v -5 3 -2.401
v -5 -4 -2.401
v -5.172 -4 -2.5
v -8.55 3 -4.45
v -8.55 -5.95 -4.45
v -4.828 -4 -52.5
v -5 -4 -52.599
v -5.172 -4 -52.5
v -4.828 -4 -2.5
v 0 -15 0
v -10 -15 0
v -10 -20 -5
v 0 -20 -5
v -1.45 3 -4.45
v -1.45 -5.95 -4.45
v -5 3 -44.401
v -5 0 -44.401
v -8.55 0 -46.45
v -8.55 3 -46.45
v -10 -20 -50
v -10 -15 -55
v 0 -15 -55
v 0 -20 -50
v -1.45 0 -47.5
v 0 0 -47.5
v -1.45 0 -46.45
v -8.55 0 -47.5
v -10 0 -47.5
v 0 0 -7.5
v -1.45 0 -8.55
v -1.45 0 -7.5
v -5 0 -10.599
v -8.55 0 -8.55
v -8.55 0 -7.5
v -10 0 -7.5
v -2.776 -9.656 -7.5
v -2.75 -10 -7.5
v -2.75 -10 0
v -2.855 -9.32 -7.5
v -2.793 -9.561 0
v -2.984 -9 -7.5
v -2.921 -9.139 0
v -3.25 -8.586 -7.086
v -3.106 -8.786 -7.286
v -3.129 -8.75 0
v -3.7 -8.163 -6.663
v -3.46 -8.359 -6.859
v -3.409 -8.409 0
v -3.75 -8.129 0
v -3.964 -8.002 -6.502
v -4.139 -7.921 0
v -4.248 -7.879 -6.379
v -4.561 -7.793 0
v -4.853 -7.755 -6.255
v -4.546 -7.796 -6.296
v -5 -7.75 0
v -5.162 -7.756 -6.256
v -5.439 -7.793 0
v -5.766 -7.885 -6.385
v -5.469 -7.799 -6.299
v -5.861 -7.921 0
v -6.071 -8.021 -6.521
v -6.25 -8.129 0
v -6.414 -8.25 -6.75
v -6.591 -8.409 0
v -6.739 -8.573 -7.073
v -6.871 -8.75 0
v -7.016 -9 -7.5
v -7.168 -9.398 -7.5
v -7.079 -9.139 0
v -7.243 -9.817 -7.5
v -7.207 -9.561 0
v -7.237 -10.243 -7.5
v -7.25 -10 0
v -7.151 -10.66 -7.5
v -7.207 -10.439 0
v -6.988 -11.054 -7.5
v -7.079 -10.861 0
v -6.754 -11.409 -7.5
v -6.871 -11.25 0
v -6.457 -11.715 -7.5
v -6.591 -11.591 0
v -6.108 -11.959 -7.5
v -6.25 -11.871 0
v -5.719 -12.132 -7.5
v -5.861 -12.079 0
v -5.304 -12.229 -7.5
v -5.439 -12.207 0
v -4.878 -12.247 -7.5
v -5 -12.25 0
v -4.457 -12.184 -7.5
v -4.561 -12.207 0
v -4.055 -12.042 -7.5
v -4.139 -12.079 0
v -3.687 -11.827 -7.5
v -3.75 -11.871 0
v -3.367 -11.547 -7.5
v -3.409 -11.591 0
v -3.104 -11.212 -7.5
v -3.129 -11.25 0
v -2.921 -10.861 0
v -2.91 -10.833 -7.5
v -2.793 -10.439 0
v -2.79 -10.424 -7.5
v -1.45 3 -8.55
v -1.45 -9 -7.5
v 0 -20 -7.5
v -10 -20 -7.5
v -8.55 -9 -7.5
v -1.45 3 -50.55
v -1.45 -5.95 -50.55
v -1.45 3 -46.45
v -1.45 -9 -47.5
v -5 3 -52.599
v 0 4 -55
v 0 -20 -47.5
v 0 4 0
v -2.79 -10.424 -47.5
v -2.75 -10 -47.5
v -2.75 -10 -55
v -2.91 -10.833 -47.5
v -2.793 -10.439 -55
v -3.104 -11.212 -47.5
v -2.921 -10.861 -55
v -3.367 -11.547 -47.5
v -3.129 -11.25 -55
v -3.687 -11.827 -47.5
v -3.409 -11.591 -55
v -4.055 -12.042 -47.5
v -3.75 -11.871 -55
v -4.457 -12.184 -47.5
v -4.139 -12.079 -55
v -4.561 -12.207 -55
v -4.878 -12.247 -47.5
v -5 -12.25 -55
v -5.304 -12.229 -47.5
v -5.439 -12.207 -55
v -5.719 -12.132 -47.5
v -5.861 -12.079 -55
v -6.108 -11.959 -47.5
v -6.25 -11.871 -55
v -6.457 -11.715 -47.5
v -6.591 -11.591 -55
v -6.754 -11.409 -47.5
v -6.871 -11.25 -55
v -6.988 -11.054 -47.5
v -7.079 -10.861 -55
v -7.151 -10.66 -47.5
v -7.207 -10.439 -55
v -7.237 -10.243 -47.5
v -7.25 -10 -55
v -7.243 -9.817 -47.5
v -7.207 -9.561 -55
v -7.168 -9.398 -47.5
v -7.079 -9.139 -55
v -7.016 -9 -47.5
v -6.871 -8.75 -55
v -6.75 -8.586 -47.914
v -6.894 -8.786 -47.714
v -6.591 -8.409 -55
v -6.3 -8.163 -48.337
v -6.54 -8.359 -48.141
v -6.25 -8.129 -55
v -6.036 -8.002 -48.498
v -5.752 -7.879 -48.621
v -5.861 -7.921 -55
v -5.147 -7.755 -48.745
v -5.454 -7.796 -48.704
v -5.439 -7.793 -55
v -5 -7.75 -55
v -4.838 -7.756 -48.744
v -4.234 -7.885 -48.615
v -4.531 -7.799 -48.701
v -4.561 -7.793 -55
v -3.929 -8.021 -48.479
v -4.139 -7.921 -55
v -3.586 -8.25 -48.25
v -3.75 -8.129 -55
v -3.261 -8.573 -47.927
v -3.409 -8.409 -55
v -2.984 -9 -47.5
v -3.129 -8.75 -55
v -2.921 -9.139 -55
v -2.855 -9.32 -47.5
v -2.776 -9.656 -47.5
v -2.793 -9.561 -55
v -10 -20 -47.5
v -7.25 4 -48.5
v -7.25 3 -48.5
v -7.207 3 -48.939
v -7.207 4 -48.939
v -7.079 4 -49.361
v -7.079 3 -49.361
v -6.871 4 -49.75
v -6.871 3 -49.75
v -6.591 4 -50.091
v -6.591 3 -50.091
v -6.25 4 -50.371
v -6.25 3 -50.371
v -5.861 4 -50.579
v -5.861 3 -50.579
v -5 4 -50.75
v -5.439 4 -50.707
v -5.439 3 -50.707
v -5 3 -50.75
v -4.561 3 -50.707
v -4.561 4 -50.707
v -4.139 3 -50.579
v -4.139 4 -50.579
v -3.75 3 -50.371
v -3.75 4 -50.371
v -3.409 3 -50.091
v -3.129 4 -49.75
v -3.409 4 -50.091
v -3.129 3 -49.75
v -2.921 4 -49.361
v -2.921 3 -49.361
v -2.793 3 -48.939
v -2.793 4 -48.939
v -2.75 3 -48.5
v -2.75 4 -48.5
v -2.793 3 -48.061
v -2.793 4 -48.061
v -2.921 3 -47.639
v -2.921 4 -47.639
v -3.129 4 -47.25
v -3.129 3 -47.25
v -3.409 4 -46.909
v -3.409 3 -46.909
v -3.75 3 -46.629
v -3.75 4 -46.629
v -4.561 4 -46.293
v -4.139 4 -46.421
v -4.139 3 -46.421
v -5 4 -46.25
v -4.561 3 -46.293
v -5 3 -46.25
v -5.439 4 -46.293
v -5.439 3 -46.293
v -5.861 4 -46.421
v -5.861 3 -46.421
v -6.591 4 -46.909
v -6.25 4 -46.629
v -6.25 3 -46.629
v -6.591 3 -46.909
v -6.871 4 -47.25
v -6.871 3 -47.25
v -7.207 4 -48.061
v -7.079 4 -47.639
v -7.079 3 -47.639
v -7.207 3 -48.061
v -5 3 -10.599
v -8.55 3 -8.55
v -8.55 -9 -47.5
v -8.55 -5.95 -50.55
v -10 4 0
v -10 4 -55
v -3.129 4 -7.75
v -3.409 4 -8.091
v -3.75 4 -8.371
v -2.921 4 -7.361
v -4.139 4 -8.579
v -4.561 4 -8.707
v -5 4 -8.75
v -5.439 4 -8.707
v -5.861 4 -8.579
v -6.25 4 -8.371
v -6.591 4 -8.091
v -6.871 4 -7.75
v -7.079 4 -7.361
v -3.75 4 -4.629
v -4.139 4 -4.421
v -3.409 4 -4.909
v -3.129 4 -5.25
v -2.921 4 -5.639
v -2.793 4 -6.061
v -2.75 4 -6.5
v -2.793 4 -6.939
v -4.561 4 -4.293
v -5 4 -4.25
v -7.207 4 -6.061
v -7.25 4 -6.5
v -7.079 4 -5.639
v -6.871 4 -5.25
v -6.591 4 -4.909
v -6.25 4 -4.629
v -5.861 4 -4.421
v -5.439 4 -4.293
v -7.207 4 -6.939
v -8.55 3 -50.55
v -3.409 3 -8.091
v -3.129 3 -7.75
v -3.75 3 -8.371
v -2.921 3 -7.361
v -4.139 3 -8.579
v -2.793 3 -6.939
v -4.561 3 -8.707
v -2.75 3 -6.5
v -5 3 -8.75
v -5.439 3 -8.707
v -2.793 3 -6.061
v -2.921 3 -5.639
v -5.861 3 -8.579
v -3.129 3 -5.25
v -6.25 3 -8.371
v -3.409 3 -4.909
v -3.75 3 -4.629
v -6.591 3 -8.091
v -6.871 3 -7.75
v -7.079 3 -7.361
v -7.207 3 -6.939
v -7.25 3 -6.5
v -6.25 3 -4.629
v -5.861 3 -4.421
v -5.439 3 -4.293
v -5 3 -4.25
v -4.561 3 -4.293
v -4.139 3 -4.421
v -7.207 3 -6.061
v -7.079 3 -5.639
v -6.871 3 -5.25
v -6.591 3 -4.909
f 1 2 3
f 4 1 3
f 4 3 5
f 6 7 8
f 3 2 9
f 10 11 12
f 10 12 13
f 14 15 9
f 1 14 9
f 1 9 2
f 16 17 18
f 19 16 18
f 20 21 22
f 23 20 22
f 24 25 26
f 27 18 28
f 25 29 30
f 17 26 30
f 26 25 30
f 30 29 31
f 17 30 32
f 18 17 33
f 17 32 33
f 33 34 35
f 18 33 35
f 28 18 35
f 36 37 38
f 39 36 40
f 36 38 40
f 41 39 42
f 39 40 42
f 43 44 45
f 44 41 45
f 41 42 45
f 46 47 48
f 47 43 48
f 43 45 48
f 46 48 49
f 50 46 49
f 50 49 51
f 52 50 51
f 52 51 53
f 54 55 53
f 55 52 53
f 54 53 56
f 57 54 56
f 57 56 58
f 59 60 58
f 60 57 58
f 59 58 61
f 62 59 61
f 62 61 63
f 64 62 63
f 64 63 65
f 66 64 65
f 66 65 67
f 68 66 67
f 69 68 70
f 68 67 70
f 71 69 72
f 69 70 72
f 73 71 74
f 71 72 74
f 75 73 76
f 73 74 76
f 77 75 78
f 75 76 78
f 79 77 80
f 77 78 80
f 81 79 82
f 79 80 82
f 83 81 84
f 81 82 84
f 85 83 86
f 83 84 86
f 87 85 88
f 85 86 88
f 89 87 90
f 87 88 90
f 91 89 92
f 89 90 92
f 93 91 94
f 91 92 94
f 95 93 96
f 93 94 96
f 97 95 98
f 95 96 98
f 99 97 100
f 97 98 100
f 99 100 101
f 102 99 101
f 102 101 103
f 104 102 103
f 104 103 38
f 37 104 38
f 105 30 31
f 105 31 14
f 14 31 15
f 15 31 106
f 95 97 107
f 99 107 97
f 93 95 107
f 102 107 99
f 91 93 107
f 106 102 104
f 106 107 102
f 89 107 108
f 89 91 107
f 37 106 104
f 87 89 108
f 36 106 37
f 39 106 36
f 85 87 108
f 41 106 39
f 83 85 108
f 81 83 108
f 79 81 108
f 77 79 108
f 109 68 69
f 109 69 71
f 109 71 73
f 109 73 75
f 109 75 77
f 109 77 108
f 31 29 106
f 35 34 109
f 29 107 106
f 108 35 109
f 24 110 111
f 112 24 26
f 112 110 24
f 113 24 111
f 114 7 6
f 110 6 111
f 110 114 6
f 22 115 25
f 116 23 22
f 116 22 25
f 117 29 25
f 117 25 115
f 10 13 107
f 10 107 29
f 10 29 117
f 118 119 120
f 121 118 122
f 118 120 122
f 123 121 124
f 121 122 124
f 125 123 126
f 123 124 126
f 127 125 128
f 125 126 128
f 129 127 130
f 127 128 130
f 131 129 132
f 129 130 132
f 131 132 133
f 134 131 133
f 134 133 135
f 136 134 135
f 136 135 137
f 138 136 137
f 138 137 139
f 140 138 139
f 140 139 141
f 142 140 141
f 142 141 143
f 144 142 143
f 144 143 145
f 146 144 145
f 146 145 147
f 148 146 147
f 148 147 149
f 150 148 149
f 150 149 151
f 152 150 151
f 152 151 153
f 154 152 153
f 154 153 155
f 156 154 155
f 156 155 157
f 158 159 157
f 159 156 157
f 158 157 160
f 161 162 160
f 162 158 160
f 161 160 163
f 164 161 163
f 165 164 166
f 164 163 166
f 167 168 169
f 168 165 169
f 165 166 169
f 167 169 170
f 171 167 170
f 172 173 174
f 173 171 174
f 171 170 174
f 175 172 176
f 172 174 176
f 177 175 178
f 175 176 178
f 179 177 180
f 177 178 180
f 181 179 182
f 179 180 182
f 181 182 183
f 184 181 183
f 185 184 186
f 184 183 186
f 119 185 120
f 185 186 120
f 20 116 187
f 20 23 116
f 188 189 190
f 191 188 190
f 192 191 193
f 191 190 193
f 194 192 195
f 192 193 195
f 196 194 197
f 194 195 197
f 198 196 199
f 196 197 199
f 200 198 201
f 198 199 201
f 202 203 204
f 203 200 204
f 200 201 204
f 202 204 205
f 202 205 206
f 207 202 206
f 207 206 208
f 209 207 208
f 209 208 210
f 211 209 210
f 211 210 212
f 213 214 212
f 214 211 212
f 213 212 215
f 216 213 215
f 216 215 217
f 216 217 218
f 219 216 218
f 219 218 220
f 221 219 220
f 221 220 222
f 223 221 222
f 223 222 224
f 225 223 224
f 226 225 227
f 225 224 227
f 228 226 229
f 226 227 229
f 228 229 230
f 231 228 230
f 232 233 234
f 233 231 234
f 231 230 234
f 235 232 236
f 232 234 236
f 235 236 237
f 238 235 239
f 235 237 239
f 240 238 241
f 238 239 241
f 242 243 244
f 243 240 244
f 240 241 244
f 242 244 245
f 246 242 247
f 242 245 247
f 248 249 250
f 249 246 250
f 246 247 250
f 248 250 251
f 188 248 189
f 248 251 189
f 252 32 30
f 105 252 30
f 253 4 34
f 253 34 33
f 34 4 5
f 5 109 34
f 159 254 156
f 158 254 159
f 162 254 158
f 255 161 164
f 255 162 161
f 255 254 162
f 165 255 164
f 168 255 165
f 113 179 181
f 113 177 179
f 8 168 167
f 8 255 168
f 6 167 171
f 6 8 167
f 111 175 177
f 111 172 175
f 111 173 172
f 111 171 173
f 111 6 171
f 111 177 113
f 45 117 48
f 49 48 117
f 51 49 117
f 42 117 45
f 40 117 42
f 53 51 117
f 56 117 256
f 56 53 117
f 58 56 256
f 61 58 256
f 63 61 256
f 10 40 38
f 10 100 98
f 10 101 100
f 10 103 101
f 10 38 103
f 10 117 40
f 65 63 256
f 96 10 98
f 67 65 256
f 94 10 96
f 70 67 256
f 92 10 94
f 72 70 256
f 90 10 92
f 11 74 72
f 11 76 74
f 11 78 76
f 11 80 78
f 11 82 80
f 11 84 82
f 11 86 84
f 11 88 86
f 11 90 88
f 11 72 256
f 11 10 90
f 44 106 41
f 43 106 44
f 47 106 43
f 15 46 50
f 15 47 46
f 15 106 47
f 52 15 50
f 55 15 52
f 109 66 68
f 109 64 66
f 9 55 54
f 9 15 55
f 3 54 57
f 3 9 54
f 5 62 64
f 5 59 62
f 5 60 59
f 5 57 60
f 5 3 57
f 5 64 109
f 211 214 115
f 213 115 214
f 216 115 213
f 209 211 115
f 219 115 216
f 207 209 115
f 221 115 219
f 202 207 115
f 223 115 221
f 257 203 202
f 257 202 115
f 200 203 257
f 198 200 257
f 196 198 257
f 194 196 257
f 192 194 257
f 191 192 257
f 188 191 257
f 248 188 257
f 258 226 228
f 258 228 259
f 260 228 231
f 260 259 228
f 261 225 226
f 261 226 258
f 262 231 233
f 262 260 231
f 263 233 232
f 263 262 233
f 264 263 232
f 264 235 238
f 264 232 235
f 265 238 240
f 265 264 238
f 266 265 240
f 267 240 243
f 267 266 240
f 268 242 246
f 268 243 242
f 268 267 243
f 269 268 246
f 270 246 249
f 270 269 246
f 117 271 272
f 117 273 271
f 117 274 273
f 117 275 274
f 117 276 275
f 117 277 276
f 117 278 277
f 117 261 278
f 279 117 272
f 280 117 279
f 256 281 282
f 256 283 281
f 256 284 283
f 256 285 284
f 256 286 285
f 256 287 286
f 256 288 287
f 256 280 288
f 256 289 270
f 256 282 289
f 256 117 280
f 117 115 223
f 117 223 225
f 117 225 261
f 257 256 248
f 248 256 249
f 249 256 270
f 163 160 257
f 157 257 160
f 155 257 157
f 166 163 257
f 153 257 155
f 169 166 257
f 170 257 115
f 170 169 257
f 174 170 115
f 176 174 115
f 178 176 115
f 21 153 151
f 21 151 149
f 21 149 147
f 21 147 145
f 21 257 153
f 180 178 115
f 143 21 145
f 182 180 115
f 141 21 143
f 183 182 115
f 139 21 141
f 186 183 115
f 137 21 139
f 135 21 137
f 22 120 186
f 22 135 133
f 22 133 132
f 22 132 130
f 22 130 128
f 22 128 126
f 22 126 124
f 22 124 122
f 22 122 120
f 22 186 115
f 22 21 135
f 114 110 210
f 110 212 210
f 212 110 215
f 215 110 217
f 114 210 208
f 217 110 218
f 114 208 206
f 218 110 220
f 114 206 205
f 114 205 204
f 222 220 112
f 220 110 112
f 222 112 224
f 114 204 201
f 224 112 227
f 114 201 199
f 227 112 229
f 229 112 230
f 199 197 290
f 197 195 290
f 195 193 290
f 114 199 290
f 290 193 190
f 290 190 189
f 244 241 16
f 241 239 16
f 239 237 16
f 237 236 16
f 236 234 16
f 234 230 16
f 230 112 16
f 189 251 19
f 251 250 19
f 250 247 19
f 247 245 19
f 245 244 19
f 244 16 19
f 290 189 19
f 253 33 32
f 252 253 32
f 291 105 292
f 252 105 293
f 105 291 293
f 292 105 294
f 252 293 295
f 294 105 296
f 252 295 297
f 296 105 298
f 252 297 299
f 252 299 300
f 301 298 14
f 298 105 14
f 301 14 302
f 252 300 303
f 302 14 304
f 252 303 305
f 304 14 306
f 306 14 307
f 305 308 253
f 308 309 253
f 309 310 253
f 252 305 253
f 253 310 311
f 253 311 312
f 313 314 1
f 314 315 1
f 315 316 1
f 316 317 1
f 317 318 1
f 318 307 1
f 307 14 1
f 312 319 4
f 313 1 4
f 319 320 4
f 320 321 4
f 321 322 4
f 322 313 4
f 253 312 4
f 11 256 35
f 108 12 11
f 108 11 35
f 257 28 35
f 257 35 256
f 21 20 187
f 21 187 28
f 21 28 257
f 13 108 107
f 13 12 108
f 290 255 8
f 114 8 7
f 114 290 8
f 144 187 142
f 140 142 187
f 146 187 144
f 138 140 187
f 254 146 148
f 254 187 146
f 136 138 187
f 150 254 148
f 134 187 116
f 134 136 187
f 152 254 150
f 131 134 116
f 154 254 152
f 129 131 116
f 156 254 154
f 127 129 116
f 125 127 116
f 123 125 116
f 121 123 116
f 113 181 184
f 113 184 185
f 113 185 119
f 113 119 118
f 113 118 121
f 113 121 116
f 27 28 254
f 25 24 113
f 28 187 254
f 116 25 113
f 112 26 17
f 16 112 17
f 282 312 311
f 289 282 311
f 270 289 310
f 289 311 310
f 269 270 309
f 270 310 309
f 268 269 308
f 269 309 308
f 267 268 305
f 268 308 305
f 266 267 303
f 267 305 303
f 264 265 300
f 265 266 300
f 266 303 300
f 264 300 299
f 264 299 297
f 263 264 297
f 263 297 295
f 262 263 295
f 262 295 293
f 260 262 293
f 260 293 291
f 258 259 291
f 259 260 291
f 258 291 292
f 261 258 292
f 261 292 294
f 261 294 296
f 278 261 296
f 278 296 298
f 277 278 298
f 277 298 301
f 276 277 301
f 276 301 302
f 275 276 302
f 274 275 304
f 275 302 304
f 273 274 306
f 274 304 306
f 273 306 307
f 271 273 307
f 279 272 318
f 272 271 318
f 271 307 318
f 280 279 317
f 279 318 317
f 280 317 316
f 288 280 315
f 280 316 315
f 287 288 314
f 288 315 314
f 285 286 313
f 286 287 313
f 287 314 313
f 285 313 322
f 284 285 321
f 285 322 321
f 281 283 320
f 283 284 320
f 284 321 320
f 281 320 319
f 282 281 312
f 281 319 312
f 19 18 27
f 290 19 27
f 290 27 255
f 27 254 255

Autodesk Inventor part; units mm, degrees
ref_plane "YZ Plane" through (0, 0, 0) normal (1, 0, 0) x (0, 1, 0)
ref_plane "XZ Plane" through (0, 0, 0) normal (0, 1, 0) x (-1, 0, 0)
sketch "Sketch1" plane through (0, 0, 0) normal (0, 1, 0) x (-1, 0, 0)
  line L0 (0, 0) -> (10, 0)
  line L1 (10, 0) -> (10, -55)
  line L2 (10, -55) -> (0, -55)
  line L3 (0, -55) -> (0, 0)
  line L4 (5, 0) -> (5, -6.5) construction
  line L5 (5, -6.5) -> (5, -48.5) construction
  circle A0 centre (5, -6.5) radius 2.25
  circle A1 centre (5, -48.5) radius 2.25
  line L6 (5, -27.5) -> (10, -27.5) construction
  line L7 (8.55, -4.4504) -> (8.55, -8.5496)
  line L8 (8.55, -8.5496) -> (5, -10.5992)
  line L9 (5, -10.5992) -> (1.45, -8.5496)
  line L10 (1.45, -8.5496) -> (1.45, -4.4504)
  line L11 (1.45, -4.4504) -> (5, -2.4008)
  line L12 (5, -2.4008) -> (8.55, -4.4504)
  line L13 (5, -44.4008) -> (8.55, -46.4504)
  line L14 (8.55, -46.4504) -> (8.55, -50.5496)
  line L15 (8.55, -50.5496) -> (5, -52.5992)
  line L16 (5, -52.5992) -> (1.45, -50.5496)
  line L17 (1.45, -50.5496) -> (1.45, -46.4504)
  line L18 (1.45, -46.4504) -> (5, -44.4008)
  line L19 (10, -27.5) -> (15, -27.5) construction
  line L20 (15, -27.5) -> (15, -17.5) construction
  line L21 (15, -27.5) -> (15, -37.5) construction
  circle A2 centre (15, -17.5) radius 2.25
  circle A3 centre (15, -37.5) radius 2.25
  line L22 (20, -17.5) -> (20, -37.5)
  line L23 (15, -27.5) -> (20, -27.5) construction
  line L24 (20, -17.5) -> (10, 0)
  line L25 (20, -37.5) -> (10, -55)
  circle A4 centre (15, -17.5) radius 4
  circle A5 centre (15, -37.5) radius 4
  line L26 (0, -27.5) -> (-5, -27.5) construction
  line L27 (-5, -27.5) -> (-5, -17.5) construction
  line L28 (-5, -27.5) -> (-5, -37.5) construction
  circle A6 centre (-5, -17.5) radius 2.25
  circle A7 centre (-5, -37.5) radius 2.25
  line L29 (-10, -17.5) -> (-10, -37.5)
  line L30 (-5, -27.5) -> (-10, -27.5) construction
  line L31 (-10, -17.5) -> (0, 0)
  line L32 (-10, -37.5) -> (0, -55)
  circle A8 centre (-5, -17.5) radius 4
  circle A9 centre (-5, -37.5) radius 4
  dimension "d2" = 10
  dimension "d3" = 55
  dimension "d4" = 7.1
  dimension "d5" = 7.1
  dimension "d6" = 42
  dimension "d7" = 4.5
  dimension "d12" = 20
  dimension "d13" = 4.5
  dimension "d15" = 20
  dimension "d16" = 8
  dimension "d17" = 8
  dimension "d18" = 10
extrude "Extrusion1" add sketch "Sketch1" along normal blind 4 contours L0 L1 L2 L3 | L7 L8 L9 L10 L11 L12 | L13 L14 L15 L16 L17 L18
extrude "Extrusion2" cut sketch "Sketch1" along normal blind 3 contours L7 L8 L9 L10 L11 L12 | L13 L14 L15 L16 L17 L18
ref_plane "Work Plane1" through (0, 0, -27.5) normal (0, 0, -1) x (-1, 0, 0)
sketch "Sketch2" plane through (0, 0, 0) normal (0, -1, 0) x (1, 0, 0)
  line L0 (-8.55, -4.4504) -> (-5, -2.4008) projected
  line L1 (-5, -2.4008) -> (-1.45, -4.4504) projected
  line L2 (-1.45, -4.4504) -> (-1.45, -8.5496) projected
  line L3 (-1.45, -8.5496) -> (-5, -10.5992) projected
  line L4 (-5, -10.5992) -> (-8.55, -8.5496) projected
  line L5 (-8.55, -8.5496) -> (-8.55, -4.4504) projected
  line L6 (-5, -44.4008) -> (-1.45, -46.4504) projected
  line L7 (-1.45, -46.4504) -> (-1.45, -50.5496) projected
  line L8 (-1.45, -50.5496) -> (-5, -52.5992) projected
  line L9 (-5, -52.5992) -> (-8.55, -50.5496) projected
  line L10 (-8.55, -50.5496) -> (-8.55, -46.4504) projected
  line L11 (-8.55, -46.4504) -> (-5, -44.4008) projected
  line L12 (0, -55) -> (-10, -55) projected
  line L13 (-10, 0) -> (0, 0) projected
  line L14 (4.2857, -7.5) -> (-14.2857, -7.5)
  line L15 (10, -27.5) -> (-20, -27.5) construction
  line L16 (0, 0) -> (0, -55) projected
  line L17 (-10, -55) -> (-10, 0) projected
  point P0 (-10, -7.5)
  point P1 (0, -7.5)
  dimension "d19" = 20
extrude "Extrusion3" add sketch "Sketch2" along normal blind 20 contours L5 L14 L17 L13 L16 L2 L1 L0 | L0 L1 L2 L14 L5
extrude "Extrusion4" cut sketch "Sketch1" against normal blind 4 contours A0 | L7 L8 L9 L10 L11 L12
chamfer "Chamfer1" distance 5 angle 45 1 edges at (-5, -4, -7.5)
sketch "Sketch3" plane through (-10, 4, 0) normal (0, 0, 1) x (1, 0, 0)
  line L0 (10, -24) -> (10, 0) projected
  line L1 (0, 0) -> (10, 0) projected
  line L2 (0, -24) -> (0, 0) projected
  line L3 (10, -24) -> (0, -24) projected
  line L4 (5, -24) -> (5, -14) construction
  circle A0 centre (5, -14) radius 2.25
  line L5 (10, -4) -> (0, -4)
  dimension "d27" = 10
  dimension "d28" = 4.5
extrude "Extrusion5" cut sketch "Sketch3" against normal through all contours A0
chamfer "Chamfer2" distance 5 angle 45 1 edges at (-5, -20, 0)
mirror "Mirror1" about plane through (0, 0, -27.5) normal (0, 0, -1) of "Extrusion5", "Extrusion3", "Extrusion4", "Chamfer1", "Chamfer2"
equation "\"d5\" = d4"
equation "\"d17\" = d16"
properties part number "Thread Bearing Bracket"
